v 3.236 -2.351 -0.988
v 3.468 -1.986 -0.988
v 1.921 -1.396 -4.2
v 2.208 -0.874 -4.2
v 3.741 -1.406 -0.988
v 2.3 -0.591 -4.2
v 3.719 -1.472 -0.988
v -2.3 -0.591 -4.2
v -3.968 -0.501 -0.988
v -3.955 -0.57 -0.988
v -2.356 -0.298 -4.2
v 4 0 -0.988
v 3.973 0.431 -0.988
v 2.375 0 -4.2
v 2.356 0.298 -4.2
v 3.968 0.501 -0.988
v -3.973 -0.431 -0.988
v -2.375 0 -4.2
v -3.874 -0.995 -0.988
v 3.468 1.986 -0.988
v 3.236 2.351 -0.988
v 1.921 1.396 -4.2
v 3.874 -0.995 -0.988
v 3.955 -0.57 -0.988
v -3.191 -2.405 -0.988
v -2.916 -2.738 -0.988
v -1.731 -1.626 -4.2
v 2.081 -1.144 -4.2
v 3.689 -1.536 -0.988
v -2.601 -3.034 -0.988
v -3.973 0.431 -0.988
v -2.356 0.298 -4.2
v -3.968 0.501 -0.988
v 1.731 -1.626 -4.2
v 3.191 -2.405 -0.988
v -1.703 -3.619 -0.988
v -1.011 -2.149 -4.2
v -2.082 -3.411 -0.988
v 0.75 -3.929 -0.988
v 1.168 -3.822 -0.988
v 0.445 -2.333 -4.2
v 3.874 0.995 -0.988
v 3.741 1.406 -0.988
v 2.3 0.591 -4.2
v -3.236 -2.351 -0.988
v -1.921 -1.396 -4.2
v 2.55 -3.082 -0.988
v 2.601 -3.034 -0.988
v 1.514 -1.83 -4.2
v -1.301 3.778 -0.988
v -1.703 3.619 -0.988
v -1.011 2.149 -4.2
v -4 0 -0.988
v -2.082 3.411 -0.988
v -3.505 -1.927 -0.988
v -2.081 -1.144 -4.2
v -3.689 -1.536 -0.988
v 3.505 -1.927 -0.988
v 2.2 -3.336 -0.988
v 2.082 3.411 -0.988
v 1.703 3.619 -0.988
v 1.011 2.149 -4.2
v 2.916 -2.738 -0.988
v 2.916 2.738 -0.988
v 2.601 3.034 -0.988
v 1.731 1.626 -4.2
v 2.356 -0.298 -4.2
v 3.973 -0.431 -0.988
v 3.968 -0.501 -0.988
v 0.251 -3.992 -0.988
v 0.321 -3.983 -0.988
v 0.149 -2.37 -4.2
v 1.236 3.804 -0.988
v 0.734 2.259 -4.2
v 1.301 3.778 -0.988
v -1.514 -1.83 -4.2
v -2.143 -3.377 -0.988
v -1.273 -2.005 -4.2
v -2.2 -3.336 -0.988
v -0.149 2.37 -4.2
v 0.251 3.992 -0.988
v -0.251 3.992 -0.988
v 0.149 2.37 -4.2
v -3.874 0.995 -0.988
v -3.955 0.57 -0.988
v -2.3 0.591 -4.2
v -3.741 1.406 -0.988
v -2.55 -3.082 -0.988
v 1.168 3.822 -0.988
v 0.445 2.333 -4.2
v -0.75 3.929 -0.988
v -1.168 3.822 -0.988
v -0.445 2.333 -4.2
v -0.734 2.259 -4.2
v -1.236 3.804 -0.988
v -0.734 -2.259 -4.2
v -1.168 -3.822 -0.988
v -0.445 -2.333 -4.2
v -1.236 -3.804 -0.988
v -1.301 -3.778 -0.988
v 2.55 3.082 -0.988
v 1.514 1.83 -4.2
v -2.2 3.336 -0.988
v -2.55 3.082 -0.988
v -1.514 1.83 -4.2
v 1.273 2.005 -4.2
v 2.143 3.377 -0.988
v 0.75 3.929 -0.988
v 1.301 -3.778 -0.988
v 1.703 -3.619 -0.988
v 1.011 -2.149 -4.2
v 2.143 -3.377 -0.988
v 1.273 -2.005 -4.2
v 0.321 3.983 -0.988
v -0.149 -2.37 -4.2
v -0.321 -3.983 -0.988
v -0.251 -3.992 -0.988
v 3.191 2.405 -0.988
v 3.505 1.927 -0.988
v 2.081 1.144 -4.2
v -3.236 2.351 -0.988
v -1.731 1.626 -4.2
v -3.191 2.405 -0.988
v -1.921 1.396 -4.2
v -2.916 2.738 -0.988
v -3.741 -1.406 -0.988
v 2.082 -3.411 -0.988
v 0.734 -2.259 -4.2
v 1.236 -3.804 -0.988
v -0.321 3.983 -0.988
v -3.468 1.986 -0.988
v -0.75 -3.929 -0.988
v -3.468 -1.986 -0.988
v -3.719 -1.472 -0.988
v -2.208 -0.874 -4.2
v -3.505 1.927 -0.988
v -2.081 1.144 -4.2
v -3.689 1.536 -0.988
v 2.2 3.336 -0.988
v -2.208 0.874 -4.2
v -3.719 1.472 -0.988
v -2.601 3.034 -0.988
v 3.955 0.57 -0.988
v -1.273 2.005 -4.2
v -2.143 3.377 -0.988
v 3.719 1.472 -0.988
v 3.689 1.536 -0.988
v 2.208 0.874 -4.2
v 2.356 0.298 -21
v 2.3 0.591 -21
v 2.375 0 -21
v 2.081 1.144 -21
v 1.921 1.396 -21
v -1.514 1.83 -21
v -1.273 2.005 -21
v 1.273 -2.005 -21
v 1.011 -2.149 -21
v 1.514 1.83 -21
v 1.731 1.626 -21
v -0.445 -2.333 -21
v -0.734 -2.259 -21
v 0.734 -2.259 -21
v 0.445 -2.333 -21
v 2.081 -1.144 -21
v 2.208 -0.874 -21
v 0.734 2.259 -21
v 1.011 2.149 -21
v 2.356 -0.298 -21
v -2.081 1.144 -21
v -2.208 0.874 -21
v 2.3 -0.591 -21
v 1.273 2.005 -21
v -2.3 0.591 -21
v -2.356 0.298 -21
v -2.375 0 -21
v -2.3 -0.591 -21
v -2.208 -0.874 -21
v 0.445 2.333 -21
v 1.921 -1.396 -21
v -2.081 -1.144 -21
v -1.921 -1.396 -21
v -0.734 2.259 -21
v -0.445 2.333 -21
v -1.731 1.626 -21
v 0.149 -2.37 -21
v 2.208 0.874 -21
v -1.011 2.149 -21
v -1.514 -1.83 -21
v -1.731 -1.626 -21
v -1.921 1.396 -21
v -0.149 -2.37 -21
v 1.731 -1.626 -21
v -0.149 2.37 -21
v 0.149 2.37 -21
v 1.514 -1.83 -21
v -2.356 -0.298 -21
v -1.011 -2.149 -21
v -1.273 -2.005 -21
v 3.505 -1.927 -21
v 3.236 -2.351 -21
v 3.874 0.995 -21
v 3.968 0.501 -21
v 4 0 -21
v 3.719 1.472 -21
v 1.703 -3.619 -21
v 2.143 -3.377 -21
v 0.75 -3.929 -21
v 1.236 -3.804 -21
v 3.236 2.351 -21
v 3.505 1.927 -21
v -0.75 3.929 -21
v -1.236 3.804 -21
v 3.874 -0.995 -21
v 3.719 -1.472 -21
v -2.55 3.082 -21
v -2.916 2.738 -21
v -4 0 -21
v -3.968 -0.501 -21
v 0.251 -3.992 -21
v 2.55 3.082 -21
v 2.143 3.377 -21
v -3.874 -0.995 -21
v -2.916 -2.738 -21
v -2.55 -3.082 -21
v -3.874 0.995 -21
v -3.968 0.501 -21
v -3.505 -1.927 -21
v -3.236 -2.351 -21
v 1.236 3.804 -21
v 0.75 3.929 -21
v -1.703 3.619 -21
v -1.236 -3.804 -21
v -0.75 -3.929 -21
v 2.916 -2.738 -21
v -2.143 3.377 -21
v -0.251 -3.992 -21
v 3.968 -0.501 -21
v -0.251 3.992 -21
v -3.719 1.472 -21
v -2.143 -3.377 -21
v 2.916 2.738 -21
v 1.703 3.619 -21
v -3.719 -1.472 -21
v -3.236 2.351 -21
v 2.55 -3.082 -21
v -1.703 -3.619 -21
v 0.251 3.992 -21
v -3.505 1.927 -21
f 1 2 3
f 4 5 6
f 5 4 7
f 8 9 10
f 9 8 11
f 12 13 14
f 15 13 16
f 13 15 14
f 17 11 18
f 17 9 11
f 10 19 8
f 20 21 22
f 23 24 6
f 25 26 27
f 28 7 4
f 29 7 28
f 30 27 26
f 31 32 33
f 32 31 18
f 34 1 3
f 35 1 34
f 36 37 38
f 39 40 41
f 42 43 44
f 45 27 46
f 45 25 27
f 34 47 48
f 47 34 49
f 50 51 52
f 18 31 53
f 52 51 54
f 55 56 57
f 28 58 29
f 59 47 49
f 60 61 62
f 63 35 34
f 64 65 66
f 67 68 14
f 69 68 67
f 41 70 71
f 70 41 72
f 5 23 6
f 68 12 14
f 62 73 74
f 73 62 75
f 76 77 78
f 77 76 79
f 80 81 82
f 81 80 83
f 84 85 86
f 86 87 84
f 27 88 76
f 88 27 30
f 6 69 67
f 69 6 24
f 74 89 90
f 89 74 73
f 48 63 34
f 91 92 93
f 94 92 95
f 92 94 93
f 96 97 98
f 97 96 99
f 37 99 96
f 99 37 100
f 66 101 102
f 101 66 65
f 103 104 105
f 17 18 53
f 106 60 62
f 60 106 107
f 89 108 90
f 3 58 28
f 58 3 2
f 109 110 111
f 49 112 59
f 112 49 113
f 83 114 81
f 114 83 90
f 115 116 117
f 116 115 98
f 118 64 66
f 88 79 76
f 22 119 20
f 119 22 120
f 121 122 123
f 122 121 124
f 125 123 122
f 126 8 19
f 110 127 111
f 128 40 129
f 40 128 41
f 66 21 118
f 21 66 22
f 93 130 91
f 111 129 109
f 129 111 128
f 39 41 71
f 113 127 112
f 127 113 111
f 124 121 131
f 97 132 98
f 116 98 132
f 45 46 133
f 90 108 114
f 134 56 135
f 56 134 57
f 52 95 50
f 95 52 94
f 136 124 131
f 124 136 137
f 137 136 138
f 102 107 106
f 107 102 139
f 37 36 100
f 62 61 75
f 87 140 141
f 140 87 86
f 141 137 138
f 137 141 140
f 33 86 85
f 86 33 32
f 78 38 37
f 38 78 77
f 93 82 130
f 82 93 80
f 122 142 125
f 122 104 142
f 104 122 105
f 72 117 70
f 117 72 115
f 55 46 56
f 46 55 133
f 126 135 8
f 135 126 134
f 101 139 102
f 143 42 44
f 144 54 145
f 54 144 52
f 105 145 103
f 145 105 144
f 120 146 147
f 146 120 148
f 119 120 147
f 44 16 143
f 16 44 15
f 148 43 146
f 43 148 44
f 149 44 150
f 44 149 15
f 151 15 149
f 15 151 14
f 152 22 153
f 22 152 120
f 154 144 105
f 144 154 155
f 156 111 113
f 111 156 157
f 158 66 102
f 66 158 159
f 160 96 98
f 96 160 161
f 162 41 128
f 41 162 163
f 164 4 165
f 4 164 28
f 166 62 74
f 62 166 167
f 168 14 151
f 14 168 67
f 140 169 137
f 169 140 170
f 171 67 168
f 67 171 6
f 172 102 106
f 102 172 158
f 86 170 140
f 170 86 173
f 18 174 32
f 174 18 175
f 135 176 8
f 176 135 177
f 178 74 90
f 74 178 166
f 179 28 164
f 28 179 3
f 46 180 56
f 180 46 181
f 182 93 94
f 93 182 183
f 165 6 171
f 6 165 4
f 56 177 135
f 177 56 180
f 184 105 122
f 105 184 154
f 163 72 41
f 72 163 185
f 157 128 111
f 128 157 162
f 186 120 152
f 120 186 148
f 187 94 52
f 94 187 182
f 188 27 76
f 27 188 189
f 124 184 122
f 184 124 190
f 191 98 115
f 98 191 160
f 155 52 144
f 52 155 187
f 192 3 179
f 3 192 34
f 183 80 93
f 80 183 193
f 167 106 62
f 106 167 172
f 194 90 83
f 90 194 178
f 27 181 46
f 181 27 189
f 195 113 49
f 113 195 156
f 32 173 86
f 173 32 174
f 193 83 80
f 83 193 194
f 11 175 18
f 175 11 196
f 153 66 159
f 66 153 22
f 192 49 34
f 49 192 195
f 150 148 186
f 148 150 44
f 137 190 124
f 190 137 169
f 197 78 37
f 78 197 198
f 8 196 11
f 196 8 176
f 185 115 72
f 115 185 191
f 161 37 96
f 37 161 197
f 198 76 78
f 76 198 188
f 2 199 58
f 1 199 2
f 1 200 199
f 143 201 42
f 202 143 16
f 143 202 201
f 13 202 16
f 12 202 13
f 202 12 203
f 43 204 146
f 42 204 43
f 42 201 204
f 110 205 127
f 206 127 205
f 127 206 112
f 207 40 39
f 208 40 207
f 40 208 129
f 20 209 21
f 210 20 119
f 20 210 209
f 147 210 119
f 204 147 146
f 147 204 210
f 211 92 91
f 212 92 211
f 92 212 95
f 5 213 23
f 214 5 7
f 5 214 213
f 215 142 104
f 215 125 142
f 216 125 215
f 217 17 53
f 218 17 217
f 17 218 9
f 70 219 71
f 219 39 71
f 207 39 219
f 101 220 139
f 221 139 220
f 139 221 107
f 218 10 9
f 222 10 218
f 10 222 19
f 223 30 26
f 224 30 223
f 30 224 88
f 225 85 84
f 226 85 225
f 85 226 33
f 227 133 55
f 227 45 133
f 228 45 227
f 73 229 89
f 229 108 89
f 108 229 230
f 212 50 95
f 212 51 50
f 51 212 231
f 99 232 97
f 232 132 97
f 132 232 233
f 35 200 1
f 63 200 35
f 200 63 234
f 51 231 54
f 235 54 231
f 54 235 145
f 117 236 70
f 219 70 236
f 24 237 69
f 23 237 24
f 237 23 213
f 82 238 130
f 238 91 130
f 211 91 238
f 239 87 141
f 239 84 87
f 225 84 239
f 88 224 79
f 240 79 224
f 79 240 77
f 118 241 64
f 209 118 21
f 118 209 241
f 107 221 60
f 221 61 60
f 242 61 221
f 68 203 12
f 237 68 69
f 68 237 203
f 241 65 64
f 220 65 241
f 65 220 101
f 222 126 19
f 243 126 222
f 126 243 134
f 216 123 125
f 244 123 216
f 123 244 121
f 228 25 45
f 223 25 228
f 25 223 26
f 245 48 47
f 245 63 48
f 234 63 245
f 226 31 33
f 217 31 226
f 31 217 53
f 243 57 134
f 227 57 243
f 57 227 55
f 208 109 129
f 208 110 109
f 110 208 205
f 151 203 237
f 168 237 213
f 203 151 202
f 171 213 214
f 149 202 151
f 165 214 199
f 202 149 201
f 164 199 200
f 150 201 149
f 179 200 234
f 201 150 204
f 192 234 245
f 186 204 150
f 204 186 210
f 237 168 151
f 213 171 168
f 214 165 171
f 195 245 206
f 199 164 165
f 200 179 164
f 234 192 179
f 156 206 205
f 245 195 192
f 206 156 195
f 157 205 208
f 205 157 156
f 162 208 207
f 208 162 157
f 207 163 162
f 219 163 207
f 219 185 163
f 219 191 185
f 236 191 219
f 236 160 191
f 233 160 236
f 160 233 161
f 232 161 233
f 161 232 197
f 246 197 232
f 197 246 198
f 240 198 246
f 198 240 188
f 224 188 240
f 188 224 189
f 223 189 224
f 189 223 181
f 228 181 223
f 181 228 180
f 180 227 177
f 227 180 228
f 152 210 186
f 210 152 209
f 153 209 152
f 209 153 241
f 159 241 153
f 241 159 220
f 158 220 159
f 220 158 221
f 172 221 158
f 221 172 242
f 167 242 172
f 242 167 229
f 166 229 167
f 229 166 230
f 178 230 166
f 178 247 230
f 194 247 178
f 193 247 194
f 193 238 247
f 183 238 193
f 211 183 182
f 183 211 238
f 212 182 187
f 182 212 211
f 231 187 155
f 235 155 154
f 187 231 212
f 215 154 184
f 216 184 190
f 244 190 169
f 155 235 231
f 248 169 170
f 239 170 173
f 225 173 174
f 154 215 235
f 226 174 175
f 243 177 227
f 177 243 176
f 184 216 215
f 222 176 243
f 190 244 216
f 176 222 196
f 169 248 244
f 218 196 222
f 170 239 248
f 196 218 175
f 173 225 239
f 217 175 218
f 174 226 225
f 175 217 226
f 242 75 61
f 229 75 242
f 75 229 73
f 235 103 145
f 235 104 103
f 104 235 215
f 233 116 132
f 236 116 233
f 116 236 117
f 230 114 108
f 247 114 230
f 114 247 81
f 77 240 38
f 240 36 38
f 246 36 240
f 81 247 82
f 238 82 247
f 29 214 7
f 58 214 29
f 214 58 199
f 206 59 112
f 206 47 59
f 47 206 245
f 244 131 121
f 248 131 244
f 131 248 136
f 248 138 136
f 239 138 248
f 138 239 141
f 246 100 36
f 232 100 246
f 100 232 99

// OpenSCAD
$fn = 50;

difference() {
	union() {
		translate(v = [0, 0, -21.0]) {
			cylinder(h = 24, r = 4.0);
		}
	}
	union() {
		translate(v = [0, 0, 0]) {
			rotate(a = [0, 0, 0]) {
				difference() {
					union() {
						translate(v = [0, 0, -24.0]) {
							cylinder(h = 24, r = 2.25);
						}
						translate(v = [0, 0, -4.2]) {
							cylinder(h = 4.2, r1 = 2.375, r2 = 4.5);
						}
						translate(v = [0, 0, -24.0]) {
							cylinder(h = 24, r = 2.375);
						}
						translate(v = [0, 0, -24.0]) {
							cylinder(h = 24, r = 2.25);
						}
					}
					union();
				}
			}
		}
		#cylinder(h = 3, r = 5.0);
	}
}
